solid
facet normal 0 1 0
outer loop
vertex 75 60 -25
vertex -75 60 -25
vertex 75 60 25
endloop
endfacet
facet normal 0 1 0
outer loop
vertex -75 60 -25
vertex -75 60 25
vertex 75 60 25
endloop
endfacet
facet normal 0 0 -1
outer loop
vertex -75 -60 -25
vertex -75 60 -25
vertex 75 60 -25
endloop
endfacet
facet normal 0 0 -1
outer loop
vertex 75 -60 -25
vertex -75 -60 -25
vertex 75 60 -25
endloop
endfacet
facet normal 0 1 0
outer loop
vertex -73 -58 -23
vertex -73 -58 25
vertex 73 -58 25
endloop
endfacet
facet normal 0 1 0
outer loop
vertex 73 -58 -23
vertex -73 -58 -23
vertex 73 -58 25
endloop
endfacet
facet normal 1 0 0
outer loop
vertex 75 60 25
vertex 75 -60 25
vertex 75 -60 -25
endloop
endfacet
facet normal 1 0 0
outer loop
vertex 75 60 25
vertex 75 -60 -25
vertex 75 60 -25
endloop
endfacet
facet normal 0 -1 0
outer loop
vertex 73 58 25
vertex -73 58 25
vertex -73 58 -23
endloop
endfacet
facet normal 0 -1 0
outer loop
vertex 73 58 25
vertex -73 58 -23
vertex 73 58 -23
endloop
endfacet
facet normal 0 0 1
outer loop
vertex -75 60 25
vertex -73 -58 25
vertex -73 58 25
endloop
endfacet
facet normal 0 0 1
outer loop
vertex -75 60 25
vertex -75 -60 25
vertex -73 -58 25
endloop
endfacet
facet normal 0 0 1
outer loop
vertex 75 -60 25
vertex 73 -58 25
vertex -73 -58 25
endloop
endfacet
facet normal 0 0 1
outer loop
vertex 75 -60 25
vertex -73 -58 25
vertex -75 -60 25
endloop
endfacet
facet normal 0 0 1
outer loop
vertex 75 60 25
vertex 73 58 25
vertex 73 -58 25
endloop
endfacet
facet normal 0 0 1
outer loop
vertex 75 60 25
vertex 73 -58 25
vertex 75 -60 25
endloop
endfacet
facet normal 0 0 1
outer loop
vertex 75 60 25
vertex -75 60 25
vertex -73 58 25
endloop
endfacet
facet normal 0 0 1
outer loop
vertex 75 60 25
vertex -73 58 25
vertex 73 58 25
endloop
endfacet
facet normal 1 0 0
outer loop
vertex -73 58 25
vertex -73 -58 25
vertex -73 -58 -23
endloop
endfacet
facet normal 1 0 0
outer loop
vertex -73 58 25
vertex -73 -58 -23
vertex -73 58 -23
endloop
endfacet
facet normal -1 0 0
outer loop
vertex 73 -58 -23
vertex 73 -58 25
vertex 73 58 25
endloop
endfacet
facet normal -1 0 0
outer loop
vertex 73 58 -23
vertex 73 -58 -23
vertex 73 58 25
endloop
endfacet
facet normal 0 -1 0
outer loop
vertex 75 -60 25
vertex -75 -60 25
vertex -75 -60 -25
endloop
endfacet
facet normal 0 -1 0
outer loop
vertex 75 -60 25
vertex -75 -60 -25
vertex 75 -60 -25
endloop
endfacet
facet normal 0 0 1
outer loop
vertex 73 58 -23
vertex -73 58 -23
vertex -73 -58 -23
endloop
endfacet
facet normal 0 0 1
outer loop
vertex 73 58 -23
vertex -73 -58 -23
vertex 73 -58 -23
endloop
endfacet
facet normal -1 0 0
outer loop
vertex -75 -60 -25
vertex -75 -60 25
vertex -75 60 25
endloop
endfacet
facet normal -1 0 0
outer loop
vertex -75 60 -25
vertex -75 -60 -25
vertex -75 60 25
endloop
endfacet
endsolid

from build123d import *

# Parameters (mm, degrees)
SKETCH1_W           = 150
SKETCH1_H           = 120
BOSS_EXTRUDE1_DEPTH = 25
SHELL1_T            = -2


with BuildPart() as part:
    # Sketch1 → Boss-Extrude1 (new, symmetric)
    with BuildSketch(Plane.XY):
        Rectangle(SKETCH1_W, SKETCH1_H)
    extrude(amount=BOSS_EXTRUDE1_DEPTH, both=True)

    # Shell1
    shell1_openings = [part.faces().sort_by_distance(p)[0] for p in [
        (0, 0, 25),
    ]]
    offset(amount=SHELL1_T, openings=shell1_openings, kind=Kind.INTERSECTION)


solid = part.part
